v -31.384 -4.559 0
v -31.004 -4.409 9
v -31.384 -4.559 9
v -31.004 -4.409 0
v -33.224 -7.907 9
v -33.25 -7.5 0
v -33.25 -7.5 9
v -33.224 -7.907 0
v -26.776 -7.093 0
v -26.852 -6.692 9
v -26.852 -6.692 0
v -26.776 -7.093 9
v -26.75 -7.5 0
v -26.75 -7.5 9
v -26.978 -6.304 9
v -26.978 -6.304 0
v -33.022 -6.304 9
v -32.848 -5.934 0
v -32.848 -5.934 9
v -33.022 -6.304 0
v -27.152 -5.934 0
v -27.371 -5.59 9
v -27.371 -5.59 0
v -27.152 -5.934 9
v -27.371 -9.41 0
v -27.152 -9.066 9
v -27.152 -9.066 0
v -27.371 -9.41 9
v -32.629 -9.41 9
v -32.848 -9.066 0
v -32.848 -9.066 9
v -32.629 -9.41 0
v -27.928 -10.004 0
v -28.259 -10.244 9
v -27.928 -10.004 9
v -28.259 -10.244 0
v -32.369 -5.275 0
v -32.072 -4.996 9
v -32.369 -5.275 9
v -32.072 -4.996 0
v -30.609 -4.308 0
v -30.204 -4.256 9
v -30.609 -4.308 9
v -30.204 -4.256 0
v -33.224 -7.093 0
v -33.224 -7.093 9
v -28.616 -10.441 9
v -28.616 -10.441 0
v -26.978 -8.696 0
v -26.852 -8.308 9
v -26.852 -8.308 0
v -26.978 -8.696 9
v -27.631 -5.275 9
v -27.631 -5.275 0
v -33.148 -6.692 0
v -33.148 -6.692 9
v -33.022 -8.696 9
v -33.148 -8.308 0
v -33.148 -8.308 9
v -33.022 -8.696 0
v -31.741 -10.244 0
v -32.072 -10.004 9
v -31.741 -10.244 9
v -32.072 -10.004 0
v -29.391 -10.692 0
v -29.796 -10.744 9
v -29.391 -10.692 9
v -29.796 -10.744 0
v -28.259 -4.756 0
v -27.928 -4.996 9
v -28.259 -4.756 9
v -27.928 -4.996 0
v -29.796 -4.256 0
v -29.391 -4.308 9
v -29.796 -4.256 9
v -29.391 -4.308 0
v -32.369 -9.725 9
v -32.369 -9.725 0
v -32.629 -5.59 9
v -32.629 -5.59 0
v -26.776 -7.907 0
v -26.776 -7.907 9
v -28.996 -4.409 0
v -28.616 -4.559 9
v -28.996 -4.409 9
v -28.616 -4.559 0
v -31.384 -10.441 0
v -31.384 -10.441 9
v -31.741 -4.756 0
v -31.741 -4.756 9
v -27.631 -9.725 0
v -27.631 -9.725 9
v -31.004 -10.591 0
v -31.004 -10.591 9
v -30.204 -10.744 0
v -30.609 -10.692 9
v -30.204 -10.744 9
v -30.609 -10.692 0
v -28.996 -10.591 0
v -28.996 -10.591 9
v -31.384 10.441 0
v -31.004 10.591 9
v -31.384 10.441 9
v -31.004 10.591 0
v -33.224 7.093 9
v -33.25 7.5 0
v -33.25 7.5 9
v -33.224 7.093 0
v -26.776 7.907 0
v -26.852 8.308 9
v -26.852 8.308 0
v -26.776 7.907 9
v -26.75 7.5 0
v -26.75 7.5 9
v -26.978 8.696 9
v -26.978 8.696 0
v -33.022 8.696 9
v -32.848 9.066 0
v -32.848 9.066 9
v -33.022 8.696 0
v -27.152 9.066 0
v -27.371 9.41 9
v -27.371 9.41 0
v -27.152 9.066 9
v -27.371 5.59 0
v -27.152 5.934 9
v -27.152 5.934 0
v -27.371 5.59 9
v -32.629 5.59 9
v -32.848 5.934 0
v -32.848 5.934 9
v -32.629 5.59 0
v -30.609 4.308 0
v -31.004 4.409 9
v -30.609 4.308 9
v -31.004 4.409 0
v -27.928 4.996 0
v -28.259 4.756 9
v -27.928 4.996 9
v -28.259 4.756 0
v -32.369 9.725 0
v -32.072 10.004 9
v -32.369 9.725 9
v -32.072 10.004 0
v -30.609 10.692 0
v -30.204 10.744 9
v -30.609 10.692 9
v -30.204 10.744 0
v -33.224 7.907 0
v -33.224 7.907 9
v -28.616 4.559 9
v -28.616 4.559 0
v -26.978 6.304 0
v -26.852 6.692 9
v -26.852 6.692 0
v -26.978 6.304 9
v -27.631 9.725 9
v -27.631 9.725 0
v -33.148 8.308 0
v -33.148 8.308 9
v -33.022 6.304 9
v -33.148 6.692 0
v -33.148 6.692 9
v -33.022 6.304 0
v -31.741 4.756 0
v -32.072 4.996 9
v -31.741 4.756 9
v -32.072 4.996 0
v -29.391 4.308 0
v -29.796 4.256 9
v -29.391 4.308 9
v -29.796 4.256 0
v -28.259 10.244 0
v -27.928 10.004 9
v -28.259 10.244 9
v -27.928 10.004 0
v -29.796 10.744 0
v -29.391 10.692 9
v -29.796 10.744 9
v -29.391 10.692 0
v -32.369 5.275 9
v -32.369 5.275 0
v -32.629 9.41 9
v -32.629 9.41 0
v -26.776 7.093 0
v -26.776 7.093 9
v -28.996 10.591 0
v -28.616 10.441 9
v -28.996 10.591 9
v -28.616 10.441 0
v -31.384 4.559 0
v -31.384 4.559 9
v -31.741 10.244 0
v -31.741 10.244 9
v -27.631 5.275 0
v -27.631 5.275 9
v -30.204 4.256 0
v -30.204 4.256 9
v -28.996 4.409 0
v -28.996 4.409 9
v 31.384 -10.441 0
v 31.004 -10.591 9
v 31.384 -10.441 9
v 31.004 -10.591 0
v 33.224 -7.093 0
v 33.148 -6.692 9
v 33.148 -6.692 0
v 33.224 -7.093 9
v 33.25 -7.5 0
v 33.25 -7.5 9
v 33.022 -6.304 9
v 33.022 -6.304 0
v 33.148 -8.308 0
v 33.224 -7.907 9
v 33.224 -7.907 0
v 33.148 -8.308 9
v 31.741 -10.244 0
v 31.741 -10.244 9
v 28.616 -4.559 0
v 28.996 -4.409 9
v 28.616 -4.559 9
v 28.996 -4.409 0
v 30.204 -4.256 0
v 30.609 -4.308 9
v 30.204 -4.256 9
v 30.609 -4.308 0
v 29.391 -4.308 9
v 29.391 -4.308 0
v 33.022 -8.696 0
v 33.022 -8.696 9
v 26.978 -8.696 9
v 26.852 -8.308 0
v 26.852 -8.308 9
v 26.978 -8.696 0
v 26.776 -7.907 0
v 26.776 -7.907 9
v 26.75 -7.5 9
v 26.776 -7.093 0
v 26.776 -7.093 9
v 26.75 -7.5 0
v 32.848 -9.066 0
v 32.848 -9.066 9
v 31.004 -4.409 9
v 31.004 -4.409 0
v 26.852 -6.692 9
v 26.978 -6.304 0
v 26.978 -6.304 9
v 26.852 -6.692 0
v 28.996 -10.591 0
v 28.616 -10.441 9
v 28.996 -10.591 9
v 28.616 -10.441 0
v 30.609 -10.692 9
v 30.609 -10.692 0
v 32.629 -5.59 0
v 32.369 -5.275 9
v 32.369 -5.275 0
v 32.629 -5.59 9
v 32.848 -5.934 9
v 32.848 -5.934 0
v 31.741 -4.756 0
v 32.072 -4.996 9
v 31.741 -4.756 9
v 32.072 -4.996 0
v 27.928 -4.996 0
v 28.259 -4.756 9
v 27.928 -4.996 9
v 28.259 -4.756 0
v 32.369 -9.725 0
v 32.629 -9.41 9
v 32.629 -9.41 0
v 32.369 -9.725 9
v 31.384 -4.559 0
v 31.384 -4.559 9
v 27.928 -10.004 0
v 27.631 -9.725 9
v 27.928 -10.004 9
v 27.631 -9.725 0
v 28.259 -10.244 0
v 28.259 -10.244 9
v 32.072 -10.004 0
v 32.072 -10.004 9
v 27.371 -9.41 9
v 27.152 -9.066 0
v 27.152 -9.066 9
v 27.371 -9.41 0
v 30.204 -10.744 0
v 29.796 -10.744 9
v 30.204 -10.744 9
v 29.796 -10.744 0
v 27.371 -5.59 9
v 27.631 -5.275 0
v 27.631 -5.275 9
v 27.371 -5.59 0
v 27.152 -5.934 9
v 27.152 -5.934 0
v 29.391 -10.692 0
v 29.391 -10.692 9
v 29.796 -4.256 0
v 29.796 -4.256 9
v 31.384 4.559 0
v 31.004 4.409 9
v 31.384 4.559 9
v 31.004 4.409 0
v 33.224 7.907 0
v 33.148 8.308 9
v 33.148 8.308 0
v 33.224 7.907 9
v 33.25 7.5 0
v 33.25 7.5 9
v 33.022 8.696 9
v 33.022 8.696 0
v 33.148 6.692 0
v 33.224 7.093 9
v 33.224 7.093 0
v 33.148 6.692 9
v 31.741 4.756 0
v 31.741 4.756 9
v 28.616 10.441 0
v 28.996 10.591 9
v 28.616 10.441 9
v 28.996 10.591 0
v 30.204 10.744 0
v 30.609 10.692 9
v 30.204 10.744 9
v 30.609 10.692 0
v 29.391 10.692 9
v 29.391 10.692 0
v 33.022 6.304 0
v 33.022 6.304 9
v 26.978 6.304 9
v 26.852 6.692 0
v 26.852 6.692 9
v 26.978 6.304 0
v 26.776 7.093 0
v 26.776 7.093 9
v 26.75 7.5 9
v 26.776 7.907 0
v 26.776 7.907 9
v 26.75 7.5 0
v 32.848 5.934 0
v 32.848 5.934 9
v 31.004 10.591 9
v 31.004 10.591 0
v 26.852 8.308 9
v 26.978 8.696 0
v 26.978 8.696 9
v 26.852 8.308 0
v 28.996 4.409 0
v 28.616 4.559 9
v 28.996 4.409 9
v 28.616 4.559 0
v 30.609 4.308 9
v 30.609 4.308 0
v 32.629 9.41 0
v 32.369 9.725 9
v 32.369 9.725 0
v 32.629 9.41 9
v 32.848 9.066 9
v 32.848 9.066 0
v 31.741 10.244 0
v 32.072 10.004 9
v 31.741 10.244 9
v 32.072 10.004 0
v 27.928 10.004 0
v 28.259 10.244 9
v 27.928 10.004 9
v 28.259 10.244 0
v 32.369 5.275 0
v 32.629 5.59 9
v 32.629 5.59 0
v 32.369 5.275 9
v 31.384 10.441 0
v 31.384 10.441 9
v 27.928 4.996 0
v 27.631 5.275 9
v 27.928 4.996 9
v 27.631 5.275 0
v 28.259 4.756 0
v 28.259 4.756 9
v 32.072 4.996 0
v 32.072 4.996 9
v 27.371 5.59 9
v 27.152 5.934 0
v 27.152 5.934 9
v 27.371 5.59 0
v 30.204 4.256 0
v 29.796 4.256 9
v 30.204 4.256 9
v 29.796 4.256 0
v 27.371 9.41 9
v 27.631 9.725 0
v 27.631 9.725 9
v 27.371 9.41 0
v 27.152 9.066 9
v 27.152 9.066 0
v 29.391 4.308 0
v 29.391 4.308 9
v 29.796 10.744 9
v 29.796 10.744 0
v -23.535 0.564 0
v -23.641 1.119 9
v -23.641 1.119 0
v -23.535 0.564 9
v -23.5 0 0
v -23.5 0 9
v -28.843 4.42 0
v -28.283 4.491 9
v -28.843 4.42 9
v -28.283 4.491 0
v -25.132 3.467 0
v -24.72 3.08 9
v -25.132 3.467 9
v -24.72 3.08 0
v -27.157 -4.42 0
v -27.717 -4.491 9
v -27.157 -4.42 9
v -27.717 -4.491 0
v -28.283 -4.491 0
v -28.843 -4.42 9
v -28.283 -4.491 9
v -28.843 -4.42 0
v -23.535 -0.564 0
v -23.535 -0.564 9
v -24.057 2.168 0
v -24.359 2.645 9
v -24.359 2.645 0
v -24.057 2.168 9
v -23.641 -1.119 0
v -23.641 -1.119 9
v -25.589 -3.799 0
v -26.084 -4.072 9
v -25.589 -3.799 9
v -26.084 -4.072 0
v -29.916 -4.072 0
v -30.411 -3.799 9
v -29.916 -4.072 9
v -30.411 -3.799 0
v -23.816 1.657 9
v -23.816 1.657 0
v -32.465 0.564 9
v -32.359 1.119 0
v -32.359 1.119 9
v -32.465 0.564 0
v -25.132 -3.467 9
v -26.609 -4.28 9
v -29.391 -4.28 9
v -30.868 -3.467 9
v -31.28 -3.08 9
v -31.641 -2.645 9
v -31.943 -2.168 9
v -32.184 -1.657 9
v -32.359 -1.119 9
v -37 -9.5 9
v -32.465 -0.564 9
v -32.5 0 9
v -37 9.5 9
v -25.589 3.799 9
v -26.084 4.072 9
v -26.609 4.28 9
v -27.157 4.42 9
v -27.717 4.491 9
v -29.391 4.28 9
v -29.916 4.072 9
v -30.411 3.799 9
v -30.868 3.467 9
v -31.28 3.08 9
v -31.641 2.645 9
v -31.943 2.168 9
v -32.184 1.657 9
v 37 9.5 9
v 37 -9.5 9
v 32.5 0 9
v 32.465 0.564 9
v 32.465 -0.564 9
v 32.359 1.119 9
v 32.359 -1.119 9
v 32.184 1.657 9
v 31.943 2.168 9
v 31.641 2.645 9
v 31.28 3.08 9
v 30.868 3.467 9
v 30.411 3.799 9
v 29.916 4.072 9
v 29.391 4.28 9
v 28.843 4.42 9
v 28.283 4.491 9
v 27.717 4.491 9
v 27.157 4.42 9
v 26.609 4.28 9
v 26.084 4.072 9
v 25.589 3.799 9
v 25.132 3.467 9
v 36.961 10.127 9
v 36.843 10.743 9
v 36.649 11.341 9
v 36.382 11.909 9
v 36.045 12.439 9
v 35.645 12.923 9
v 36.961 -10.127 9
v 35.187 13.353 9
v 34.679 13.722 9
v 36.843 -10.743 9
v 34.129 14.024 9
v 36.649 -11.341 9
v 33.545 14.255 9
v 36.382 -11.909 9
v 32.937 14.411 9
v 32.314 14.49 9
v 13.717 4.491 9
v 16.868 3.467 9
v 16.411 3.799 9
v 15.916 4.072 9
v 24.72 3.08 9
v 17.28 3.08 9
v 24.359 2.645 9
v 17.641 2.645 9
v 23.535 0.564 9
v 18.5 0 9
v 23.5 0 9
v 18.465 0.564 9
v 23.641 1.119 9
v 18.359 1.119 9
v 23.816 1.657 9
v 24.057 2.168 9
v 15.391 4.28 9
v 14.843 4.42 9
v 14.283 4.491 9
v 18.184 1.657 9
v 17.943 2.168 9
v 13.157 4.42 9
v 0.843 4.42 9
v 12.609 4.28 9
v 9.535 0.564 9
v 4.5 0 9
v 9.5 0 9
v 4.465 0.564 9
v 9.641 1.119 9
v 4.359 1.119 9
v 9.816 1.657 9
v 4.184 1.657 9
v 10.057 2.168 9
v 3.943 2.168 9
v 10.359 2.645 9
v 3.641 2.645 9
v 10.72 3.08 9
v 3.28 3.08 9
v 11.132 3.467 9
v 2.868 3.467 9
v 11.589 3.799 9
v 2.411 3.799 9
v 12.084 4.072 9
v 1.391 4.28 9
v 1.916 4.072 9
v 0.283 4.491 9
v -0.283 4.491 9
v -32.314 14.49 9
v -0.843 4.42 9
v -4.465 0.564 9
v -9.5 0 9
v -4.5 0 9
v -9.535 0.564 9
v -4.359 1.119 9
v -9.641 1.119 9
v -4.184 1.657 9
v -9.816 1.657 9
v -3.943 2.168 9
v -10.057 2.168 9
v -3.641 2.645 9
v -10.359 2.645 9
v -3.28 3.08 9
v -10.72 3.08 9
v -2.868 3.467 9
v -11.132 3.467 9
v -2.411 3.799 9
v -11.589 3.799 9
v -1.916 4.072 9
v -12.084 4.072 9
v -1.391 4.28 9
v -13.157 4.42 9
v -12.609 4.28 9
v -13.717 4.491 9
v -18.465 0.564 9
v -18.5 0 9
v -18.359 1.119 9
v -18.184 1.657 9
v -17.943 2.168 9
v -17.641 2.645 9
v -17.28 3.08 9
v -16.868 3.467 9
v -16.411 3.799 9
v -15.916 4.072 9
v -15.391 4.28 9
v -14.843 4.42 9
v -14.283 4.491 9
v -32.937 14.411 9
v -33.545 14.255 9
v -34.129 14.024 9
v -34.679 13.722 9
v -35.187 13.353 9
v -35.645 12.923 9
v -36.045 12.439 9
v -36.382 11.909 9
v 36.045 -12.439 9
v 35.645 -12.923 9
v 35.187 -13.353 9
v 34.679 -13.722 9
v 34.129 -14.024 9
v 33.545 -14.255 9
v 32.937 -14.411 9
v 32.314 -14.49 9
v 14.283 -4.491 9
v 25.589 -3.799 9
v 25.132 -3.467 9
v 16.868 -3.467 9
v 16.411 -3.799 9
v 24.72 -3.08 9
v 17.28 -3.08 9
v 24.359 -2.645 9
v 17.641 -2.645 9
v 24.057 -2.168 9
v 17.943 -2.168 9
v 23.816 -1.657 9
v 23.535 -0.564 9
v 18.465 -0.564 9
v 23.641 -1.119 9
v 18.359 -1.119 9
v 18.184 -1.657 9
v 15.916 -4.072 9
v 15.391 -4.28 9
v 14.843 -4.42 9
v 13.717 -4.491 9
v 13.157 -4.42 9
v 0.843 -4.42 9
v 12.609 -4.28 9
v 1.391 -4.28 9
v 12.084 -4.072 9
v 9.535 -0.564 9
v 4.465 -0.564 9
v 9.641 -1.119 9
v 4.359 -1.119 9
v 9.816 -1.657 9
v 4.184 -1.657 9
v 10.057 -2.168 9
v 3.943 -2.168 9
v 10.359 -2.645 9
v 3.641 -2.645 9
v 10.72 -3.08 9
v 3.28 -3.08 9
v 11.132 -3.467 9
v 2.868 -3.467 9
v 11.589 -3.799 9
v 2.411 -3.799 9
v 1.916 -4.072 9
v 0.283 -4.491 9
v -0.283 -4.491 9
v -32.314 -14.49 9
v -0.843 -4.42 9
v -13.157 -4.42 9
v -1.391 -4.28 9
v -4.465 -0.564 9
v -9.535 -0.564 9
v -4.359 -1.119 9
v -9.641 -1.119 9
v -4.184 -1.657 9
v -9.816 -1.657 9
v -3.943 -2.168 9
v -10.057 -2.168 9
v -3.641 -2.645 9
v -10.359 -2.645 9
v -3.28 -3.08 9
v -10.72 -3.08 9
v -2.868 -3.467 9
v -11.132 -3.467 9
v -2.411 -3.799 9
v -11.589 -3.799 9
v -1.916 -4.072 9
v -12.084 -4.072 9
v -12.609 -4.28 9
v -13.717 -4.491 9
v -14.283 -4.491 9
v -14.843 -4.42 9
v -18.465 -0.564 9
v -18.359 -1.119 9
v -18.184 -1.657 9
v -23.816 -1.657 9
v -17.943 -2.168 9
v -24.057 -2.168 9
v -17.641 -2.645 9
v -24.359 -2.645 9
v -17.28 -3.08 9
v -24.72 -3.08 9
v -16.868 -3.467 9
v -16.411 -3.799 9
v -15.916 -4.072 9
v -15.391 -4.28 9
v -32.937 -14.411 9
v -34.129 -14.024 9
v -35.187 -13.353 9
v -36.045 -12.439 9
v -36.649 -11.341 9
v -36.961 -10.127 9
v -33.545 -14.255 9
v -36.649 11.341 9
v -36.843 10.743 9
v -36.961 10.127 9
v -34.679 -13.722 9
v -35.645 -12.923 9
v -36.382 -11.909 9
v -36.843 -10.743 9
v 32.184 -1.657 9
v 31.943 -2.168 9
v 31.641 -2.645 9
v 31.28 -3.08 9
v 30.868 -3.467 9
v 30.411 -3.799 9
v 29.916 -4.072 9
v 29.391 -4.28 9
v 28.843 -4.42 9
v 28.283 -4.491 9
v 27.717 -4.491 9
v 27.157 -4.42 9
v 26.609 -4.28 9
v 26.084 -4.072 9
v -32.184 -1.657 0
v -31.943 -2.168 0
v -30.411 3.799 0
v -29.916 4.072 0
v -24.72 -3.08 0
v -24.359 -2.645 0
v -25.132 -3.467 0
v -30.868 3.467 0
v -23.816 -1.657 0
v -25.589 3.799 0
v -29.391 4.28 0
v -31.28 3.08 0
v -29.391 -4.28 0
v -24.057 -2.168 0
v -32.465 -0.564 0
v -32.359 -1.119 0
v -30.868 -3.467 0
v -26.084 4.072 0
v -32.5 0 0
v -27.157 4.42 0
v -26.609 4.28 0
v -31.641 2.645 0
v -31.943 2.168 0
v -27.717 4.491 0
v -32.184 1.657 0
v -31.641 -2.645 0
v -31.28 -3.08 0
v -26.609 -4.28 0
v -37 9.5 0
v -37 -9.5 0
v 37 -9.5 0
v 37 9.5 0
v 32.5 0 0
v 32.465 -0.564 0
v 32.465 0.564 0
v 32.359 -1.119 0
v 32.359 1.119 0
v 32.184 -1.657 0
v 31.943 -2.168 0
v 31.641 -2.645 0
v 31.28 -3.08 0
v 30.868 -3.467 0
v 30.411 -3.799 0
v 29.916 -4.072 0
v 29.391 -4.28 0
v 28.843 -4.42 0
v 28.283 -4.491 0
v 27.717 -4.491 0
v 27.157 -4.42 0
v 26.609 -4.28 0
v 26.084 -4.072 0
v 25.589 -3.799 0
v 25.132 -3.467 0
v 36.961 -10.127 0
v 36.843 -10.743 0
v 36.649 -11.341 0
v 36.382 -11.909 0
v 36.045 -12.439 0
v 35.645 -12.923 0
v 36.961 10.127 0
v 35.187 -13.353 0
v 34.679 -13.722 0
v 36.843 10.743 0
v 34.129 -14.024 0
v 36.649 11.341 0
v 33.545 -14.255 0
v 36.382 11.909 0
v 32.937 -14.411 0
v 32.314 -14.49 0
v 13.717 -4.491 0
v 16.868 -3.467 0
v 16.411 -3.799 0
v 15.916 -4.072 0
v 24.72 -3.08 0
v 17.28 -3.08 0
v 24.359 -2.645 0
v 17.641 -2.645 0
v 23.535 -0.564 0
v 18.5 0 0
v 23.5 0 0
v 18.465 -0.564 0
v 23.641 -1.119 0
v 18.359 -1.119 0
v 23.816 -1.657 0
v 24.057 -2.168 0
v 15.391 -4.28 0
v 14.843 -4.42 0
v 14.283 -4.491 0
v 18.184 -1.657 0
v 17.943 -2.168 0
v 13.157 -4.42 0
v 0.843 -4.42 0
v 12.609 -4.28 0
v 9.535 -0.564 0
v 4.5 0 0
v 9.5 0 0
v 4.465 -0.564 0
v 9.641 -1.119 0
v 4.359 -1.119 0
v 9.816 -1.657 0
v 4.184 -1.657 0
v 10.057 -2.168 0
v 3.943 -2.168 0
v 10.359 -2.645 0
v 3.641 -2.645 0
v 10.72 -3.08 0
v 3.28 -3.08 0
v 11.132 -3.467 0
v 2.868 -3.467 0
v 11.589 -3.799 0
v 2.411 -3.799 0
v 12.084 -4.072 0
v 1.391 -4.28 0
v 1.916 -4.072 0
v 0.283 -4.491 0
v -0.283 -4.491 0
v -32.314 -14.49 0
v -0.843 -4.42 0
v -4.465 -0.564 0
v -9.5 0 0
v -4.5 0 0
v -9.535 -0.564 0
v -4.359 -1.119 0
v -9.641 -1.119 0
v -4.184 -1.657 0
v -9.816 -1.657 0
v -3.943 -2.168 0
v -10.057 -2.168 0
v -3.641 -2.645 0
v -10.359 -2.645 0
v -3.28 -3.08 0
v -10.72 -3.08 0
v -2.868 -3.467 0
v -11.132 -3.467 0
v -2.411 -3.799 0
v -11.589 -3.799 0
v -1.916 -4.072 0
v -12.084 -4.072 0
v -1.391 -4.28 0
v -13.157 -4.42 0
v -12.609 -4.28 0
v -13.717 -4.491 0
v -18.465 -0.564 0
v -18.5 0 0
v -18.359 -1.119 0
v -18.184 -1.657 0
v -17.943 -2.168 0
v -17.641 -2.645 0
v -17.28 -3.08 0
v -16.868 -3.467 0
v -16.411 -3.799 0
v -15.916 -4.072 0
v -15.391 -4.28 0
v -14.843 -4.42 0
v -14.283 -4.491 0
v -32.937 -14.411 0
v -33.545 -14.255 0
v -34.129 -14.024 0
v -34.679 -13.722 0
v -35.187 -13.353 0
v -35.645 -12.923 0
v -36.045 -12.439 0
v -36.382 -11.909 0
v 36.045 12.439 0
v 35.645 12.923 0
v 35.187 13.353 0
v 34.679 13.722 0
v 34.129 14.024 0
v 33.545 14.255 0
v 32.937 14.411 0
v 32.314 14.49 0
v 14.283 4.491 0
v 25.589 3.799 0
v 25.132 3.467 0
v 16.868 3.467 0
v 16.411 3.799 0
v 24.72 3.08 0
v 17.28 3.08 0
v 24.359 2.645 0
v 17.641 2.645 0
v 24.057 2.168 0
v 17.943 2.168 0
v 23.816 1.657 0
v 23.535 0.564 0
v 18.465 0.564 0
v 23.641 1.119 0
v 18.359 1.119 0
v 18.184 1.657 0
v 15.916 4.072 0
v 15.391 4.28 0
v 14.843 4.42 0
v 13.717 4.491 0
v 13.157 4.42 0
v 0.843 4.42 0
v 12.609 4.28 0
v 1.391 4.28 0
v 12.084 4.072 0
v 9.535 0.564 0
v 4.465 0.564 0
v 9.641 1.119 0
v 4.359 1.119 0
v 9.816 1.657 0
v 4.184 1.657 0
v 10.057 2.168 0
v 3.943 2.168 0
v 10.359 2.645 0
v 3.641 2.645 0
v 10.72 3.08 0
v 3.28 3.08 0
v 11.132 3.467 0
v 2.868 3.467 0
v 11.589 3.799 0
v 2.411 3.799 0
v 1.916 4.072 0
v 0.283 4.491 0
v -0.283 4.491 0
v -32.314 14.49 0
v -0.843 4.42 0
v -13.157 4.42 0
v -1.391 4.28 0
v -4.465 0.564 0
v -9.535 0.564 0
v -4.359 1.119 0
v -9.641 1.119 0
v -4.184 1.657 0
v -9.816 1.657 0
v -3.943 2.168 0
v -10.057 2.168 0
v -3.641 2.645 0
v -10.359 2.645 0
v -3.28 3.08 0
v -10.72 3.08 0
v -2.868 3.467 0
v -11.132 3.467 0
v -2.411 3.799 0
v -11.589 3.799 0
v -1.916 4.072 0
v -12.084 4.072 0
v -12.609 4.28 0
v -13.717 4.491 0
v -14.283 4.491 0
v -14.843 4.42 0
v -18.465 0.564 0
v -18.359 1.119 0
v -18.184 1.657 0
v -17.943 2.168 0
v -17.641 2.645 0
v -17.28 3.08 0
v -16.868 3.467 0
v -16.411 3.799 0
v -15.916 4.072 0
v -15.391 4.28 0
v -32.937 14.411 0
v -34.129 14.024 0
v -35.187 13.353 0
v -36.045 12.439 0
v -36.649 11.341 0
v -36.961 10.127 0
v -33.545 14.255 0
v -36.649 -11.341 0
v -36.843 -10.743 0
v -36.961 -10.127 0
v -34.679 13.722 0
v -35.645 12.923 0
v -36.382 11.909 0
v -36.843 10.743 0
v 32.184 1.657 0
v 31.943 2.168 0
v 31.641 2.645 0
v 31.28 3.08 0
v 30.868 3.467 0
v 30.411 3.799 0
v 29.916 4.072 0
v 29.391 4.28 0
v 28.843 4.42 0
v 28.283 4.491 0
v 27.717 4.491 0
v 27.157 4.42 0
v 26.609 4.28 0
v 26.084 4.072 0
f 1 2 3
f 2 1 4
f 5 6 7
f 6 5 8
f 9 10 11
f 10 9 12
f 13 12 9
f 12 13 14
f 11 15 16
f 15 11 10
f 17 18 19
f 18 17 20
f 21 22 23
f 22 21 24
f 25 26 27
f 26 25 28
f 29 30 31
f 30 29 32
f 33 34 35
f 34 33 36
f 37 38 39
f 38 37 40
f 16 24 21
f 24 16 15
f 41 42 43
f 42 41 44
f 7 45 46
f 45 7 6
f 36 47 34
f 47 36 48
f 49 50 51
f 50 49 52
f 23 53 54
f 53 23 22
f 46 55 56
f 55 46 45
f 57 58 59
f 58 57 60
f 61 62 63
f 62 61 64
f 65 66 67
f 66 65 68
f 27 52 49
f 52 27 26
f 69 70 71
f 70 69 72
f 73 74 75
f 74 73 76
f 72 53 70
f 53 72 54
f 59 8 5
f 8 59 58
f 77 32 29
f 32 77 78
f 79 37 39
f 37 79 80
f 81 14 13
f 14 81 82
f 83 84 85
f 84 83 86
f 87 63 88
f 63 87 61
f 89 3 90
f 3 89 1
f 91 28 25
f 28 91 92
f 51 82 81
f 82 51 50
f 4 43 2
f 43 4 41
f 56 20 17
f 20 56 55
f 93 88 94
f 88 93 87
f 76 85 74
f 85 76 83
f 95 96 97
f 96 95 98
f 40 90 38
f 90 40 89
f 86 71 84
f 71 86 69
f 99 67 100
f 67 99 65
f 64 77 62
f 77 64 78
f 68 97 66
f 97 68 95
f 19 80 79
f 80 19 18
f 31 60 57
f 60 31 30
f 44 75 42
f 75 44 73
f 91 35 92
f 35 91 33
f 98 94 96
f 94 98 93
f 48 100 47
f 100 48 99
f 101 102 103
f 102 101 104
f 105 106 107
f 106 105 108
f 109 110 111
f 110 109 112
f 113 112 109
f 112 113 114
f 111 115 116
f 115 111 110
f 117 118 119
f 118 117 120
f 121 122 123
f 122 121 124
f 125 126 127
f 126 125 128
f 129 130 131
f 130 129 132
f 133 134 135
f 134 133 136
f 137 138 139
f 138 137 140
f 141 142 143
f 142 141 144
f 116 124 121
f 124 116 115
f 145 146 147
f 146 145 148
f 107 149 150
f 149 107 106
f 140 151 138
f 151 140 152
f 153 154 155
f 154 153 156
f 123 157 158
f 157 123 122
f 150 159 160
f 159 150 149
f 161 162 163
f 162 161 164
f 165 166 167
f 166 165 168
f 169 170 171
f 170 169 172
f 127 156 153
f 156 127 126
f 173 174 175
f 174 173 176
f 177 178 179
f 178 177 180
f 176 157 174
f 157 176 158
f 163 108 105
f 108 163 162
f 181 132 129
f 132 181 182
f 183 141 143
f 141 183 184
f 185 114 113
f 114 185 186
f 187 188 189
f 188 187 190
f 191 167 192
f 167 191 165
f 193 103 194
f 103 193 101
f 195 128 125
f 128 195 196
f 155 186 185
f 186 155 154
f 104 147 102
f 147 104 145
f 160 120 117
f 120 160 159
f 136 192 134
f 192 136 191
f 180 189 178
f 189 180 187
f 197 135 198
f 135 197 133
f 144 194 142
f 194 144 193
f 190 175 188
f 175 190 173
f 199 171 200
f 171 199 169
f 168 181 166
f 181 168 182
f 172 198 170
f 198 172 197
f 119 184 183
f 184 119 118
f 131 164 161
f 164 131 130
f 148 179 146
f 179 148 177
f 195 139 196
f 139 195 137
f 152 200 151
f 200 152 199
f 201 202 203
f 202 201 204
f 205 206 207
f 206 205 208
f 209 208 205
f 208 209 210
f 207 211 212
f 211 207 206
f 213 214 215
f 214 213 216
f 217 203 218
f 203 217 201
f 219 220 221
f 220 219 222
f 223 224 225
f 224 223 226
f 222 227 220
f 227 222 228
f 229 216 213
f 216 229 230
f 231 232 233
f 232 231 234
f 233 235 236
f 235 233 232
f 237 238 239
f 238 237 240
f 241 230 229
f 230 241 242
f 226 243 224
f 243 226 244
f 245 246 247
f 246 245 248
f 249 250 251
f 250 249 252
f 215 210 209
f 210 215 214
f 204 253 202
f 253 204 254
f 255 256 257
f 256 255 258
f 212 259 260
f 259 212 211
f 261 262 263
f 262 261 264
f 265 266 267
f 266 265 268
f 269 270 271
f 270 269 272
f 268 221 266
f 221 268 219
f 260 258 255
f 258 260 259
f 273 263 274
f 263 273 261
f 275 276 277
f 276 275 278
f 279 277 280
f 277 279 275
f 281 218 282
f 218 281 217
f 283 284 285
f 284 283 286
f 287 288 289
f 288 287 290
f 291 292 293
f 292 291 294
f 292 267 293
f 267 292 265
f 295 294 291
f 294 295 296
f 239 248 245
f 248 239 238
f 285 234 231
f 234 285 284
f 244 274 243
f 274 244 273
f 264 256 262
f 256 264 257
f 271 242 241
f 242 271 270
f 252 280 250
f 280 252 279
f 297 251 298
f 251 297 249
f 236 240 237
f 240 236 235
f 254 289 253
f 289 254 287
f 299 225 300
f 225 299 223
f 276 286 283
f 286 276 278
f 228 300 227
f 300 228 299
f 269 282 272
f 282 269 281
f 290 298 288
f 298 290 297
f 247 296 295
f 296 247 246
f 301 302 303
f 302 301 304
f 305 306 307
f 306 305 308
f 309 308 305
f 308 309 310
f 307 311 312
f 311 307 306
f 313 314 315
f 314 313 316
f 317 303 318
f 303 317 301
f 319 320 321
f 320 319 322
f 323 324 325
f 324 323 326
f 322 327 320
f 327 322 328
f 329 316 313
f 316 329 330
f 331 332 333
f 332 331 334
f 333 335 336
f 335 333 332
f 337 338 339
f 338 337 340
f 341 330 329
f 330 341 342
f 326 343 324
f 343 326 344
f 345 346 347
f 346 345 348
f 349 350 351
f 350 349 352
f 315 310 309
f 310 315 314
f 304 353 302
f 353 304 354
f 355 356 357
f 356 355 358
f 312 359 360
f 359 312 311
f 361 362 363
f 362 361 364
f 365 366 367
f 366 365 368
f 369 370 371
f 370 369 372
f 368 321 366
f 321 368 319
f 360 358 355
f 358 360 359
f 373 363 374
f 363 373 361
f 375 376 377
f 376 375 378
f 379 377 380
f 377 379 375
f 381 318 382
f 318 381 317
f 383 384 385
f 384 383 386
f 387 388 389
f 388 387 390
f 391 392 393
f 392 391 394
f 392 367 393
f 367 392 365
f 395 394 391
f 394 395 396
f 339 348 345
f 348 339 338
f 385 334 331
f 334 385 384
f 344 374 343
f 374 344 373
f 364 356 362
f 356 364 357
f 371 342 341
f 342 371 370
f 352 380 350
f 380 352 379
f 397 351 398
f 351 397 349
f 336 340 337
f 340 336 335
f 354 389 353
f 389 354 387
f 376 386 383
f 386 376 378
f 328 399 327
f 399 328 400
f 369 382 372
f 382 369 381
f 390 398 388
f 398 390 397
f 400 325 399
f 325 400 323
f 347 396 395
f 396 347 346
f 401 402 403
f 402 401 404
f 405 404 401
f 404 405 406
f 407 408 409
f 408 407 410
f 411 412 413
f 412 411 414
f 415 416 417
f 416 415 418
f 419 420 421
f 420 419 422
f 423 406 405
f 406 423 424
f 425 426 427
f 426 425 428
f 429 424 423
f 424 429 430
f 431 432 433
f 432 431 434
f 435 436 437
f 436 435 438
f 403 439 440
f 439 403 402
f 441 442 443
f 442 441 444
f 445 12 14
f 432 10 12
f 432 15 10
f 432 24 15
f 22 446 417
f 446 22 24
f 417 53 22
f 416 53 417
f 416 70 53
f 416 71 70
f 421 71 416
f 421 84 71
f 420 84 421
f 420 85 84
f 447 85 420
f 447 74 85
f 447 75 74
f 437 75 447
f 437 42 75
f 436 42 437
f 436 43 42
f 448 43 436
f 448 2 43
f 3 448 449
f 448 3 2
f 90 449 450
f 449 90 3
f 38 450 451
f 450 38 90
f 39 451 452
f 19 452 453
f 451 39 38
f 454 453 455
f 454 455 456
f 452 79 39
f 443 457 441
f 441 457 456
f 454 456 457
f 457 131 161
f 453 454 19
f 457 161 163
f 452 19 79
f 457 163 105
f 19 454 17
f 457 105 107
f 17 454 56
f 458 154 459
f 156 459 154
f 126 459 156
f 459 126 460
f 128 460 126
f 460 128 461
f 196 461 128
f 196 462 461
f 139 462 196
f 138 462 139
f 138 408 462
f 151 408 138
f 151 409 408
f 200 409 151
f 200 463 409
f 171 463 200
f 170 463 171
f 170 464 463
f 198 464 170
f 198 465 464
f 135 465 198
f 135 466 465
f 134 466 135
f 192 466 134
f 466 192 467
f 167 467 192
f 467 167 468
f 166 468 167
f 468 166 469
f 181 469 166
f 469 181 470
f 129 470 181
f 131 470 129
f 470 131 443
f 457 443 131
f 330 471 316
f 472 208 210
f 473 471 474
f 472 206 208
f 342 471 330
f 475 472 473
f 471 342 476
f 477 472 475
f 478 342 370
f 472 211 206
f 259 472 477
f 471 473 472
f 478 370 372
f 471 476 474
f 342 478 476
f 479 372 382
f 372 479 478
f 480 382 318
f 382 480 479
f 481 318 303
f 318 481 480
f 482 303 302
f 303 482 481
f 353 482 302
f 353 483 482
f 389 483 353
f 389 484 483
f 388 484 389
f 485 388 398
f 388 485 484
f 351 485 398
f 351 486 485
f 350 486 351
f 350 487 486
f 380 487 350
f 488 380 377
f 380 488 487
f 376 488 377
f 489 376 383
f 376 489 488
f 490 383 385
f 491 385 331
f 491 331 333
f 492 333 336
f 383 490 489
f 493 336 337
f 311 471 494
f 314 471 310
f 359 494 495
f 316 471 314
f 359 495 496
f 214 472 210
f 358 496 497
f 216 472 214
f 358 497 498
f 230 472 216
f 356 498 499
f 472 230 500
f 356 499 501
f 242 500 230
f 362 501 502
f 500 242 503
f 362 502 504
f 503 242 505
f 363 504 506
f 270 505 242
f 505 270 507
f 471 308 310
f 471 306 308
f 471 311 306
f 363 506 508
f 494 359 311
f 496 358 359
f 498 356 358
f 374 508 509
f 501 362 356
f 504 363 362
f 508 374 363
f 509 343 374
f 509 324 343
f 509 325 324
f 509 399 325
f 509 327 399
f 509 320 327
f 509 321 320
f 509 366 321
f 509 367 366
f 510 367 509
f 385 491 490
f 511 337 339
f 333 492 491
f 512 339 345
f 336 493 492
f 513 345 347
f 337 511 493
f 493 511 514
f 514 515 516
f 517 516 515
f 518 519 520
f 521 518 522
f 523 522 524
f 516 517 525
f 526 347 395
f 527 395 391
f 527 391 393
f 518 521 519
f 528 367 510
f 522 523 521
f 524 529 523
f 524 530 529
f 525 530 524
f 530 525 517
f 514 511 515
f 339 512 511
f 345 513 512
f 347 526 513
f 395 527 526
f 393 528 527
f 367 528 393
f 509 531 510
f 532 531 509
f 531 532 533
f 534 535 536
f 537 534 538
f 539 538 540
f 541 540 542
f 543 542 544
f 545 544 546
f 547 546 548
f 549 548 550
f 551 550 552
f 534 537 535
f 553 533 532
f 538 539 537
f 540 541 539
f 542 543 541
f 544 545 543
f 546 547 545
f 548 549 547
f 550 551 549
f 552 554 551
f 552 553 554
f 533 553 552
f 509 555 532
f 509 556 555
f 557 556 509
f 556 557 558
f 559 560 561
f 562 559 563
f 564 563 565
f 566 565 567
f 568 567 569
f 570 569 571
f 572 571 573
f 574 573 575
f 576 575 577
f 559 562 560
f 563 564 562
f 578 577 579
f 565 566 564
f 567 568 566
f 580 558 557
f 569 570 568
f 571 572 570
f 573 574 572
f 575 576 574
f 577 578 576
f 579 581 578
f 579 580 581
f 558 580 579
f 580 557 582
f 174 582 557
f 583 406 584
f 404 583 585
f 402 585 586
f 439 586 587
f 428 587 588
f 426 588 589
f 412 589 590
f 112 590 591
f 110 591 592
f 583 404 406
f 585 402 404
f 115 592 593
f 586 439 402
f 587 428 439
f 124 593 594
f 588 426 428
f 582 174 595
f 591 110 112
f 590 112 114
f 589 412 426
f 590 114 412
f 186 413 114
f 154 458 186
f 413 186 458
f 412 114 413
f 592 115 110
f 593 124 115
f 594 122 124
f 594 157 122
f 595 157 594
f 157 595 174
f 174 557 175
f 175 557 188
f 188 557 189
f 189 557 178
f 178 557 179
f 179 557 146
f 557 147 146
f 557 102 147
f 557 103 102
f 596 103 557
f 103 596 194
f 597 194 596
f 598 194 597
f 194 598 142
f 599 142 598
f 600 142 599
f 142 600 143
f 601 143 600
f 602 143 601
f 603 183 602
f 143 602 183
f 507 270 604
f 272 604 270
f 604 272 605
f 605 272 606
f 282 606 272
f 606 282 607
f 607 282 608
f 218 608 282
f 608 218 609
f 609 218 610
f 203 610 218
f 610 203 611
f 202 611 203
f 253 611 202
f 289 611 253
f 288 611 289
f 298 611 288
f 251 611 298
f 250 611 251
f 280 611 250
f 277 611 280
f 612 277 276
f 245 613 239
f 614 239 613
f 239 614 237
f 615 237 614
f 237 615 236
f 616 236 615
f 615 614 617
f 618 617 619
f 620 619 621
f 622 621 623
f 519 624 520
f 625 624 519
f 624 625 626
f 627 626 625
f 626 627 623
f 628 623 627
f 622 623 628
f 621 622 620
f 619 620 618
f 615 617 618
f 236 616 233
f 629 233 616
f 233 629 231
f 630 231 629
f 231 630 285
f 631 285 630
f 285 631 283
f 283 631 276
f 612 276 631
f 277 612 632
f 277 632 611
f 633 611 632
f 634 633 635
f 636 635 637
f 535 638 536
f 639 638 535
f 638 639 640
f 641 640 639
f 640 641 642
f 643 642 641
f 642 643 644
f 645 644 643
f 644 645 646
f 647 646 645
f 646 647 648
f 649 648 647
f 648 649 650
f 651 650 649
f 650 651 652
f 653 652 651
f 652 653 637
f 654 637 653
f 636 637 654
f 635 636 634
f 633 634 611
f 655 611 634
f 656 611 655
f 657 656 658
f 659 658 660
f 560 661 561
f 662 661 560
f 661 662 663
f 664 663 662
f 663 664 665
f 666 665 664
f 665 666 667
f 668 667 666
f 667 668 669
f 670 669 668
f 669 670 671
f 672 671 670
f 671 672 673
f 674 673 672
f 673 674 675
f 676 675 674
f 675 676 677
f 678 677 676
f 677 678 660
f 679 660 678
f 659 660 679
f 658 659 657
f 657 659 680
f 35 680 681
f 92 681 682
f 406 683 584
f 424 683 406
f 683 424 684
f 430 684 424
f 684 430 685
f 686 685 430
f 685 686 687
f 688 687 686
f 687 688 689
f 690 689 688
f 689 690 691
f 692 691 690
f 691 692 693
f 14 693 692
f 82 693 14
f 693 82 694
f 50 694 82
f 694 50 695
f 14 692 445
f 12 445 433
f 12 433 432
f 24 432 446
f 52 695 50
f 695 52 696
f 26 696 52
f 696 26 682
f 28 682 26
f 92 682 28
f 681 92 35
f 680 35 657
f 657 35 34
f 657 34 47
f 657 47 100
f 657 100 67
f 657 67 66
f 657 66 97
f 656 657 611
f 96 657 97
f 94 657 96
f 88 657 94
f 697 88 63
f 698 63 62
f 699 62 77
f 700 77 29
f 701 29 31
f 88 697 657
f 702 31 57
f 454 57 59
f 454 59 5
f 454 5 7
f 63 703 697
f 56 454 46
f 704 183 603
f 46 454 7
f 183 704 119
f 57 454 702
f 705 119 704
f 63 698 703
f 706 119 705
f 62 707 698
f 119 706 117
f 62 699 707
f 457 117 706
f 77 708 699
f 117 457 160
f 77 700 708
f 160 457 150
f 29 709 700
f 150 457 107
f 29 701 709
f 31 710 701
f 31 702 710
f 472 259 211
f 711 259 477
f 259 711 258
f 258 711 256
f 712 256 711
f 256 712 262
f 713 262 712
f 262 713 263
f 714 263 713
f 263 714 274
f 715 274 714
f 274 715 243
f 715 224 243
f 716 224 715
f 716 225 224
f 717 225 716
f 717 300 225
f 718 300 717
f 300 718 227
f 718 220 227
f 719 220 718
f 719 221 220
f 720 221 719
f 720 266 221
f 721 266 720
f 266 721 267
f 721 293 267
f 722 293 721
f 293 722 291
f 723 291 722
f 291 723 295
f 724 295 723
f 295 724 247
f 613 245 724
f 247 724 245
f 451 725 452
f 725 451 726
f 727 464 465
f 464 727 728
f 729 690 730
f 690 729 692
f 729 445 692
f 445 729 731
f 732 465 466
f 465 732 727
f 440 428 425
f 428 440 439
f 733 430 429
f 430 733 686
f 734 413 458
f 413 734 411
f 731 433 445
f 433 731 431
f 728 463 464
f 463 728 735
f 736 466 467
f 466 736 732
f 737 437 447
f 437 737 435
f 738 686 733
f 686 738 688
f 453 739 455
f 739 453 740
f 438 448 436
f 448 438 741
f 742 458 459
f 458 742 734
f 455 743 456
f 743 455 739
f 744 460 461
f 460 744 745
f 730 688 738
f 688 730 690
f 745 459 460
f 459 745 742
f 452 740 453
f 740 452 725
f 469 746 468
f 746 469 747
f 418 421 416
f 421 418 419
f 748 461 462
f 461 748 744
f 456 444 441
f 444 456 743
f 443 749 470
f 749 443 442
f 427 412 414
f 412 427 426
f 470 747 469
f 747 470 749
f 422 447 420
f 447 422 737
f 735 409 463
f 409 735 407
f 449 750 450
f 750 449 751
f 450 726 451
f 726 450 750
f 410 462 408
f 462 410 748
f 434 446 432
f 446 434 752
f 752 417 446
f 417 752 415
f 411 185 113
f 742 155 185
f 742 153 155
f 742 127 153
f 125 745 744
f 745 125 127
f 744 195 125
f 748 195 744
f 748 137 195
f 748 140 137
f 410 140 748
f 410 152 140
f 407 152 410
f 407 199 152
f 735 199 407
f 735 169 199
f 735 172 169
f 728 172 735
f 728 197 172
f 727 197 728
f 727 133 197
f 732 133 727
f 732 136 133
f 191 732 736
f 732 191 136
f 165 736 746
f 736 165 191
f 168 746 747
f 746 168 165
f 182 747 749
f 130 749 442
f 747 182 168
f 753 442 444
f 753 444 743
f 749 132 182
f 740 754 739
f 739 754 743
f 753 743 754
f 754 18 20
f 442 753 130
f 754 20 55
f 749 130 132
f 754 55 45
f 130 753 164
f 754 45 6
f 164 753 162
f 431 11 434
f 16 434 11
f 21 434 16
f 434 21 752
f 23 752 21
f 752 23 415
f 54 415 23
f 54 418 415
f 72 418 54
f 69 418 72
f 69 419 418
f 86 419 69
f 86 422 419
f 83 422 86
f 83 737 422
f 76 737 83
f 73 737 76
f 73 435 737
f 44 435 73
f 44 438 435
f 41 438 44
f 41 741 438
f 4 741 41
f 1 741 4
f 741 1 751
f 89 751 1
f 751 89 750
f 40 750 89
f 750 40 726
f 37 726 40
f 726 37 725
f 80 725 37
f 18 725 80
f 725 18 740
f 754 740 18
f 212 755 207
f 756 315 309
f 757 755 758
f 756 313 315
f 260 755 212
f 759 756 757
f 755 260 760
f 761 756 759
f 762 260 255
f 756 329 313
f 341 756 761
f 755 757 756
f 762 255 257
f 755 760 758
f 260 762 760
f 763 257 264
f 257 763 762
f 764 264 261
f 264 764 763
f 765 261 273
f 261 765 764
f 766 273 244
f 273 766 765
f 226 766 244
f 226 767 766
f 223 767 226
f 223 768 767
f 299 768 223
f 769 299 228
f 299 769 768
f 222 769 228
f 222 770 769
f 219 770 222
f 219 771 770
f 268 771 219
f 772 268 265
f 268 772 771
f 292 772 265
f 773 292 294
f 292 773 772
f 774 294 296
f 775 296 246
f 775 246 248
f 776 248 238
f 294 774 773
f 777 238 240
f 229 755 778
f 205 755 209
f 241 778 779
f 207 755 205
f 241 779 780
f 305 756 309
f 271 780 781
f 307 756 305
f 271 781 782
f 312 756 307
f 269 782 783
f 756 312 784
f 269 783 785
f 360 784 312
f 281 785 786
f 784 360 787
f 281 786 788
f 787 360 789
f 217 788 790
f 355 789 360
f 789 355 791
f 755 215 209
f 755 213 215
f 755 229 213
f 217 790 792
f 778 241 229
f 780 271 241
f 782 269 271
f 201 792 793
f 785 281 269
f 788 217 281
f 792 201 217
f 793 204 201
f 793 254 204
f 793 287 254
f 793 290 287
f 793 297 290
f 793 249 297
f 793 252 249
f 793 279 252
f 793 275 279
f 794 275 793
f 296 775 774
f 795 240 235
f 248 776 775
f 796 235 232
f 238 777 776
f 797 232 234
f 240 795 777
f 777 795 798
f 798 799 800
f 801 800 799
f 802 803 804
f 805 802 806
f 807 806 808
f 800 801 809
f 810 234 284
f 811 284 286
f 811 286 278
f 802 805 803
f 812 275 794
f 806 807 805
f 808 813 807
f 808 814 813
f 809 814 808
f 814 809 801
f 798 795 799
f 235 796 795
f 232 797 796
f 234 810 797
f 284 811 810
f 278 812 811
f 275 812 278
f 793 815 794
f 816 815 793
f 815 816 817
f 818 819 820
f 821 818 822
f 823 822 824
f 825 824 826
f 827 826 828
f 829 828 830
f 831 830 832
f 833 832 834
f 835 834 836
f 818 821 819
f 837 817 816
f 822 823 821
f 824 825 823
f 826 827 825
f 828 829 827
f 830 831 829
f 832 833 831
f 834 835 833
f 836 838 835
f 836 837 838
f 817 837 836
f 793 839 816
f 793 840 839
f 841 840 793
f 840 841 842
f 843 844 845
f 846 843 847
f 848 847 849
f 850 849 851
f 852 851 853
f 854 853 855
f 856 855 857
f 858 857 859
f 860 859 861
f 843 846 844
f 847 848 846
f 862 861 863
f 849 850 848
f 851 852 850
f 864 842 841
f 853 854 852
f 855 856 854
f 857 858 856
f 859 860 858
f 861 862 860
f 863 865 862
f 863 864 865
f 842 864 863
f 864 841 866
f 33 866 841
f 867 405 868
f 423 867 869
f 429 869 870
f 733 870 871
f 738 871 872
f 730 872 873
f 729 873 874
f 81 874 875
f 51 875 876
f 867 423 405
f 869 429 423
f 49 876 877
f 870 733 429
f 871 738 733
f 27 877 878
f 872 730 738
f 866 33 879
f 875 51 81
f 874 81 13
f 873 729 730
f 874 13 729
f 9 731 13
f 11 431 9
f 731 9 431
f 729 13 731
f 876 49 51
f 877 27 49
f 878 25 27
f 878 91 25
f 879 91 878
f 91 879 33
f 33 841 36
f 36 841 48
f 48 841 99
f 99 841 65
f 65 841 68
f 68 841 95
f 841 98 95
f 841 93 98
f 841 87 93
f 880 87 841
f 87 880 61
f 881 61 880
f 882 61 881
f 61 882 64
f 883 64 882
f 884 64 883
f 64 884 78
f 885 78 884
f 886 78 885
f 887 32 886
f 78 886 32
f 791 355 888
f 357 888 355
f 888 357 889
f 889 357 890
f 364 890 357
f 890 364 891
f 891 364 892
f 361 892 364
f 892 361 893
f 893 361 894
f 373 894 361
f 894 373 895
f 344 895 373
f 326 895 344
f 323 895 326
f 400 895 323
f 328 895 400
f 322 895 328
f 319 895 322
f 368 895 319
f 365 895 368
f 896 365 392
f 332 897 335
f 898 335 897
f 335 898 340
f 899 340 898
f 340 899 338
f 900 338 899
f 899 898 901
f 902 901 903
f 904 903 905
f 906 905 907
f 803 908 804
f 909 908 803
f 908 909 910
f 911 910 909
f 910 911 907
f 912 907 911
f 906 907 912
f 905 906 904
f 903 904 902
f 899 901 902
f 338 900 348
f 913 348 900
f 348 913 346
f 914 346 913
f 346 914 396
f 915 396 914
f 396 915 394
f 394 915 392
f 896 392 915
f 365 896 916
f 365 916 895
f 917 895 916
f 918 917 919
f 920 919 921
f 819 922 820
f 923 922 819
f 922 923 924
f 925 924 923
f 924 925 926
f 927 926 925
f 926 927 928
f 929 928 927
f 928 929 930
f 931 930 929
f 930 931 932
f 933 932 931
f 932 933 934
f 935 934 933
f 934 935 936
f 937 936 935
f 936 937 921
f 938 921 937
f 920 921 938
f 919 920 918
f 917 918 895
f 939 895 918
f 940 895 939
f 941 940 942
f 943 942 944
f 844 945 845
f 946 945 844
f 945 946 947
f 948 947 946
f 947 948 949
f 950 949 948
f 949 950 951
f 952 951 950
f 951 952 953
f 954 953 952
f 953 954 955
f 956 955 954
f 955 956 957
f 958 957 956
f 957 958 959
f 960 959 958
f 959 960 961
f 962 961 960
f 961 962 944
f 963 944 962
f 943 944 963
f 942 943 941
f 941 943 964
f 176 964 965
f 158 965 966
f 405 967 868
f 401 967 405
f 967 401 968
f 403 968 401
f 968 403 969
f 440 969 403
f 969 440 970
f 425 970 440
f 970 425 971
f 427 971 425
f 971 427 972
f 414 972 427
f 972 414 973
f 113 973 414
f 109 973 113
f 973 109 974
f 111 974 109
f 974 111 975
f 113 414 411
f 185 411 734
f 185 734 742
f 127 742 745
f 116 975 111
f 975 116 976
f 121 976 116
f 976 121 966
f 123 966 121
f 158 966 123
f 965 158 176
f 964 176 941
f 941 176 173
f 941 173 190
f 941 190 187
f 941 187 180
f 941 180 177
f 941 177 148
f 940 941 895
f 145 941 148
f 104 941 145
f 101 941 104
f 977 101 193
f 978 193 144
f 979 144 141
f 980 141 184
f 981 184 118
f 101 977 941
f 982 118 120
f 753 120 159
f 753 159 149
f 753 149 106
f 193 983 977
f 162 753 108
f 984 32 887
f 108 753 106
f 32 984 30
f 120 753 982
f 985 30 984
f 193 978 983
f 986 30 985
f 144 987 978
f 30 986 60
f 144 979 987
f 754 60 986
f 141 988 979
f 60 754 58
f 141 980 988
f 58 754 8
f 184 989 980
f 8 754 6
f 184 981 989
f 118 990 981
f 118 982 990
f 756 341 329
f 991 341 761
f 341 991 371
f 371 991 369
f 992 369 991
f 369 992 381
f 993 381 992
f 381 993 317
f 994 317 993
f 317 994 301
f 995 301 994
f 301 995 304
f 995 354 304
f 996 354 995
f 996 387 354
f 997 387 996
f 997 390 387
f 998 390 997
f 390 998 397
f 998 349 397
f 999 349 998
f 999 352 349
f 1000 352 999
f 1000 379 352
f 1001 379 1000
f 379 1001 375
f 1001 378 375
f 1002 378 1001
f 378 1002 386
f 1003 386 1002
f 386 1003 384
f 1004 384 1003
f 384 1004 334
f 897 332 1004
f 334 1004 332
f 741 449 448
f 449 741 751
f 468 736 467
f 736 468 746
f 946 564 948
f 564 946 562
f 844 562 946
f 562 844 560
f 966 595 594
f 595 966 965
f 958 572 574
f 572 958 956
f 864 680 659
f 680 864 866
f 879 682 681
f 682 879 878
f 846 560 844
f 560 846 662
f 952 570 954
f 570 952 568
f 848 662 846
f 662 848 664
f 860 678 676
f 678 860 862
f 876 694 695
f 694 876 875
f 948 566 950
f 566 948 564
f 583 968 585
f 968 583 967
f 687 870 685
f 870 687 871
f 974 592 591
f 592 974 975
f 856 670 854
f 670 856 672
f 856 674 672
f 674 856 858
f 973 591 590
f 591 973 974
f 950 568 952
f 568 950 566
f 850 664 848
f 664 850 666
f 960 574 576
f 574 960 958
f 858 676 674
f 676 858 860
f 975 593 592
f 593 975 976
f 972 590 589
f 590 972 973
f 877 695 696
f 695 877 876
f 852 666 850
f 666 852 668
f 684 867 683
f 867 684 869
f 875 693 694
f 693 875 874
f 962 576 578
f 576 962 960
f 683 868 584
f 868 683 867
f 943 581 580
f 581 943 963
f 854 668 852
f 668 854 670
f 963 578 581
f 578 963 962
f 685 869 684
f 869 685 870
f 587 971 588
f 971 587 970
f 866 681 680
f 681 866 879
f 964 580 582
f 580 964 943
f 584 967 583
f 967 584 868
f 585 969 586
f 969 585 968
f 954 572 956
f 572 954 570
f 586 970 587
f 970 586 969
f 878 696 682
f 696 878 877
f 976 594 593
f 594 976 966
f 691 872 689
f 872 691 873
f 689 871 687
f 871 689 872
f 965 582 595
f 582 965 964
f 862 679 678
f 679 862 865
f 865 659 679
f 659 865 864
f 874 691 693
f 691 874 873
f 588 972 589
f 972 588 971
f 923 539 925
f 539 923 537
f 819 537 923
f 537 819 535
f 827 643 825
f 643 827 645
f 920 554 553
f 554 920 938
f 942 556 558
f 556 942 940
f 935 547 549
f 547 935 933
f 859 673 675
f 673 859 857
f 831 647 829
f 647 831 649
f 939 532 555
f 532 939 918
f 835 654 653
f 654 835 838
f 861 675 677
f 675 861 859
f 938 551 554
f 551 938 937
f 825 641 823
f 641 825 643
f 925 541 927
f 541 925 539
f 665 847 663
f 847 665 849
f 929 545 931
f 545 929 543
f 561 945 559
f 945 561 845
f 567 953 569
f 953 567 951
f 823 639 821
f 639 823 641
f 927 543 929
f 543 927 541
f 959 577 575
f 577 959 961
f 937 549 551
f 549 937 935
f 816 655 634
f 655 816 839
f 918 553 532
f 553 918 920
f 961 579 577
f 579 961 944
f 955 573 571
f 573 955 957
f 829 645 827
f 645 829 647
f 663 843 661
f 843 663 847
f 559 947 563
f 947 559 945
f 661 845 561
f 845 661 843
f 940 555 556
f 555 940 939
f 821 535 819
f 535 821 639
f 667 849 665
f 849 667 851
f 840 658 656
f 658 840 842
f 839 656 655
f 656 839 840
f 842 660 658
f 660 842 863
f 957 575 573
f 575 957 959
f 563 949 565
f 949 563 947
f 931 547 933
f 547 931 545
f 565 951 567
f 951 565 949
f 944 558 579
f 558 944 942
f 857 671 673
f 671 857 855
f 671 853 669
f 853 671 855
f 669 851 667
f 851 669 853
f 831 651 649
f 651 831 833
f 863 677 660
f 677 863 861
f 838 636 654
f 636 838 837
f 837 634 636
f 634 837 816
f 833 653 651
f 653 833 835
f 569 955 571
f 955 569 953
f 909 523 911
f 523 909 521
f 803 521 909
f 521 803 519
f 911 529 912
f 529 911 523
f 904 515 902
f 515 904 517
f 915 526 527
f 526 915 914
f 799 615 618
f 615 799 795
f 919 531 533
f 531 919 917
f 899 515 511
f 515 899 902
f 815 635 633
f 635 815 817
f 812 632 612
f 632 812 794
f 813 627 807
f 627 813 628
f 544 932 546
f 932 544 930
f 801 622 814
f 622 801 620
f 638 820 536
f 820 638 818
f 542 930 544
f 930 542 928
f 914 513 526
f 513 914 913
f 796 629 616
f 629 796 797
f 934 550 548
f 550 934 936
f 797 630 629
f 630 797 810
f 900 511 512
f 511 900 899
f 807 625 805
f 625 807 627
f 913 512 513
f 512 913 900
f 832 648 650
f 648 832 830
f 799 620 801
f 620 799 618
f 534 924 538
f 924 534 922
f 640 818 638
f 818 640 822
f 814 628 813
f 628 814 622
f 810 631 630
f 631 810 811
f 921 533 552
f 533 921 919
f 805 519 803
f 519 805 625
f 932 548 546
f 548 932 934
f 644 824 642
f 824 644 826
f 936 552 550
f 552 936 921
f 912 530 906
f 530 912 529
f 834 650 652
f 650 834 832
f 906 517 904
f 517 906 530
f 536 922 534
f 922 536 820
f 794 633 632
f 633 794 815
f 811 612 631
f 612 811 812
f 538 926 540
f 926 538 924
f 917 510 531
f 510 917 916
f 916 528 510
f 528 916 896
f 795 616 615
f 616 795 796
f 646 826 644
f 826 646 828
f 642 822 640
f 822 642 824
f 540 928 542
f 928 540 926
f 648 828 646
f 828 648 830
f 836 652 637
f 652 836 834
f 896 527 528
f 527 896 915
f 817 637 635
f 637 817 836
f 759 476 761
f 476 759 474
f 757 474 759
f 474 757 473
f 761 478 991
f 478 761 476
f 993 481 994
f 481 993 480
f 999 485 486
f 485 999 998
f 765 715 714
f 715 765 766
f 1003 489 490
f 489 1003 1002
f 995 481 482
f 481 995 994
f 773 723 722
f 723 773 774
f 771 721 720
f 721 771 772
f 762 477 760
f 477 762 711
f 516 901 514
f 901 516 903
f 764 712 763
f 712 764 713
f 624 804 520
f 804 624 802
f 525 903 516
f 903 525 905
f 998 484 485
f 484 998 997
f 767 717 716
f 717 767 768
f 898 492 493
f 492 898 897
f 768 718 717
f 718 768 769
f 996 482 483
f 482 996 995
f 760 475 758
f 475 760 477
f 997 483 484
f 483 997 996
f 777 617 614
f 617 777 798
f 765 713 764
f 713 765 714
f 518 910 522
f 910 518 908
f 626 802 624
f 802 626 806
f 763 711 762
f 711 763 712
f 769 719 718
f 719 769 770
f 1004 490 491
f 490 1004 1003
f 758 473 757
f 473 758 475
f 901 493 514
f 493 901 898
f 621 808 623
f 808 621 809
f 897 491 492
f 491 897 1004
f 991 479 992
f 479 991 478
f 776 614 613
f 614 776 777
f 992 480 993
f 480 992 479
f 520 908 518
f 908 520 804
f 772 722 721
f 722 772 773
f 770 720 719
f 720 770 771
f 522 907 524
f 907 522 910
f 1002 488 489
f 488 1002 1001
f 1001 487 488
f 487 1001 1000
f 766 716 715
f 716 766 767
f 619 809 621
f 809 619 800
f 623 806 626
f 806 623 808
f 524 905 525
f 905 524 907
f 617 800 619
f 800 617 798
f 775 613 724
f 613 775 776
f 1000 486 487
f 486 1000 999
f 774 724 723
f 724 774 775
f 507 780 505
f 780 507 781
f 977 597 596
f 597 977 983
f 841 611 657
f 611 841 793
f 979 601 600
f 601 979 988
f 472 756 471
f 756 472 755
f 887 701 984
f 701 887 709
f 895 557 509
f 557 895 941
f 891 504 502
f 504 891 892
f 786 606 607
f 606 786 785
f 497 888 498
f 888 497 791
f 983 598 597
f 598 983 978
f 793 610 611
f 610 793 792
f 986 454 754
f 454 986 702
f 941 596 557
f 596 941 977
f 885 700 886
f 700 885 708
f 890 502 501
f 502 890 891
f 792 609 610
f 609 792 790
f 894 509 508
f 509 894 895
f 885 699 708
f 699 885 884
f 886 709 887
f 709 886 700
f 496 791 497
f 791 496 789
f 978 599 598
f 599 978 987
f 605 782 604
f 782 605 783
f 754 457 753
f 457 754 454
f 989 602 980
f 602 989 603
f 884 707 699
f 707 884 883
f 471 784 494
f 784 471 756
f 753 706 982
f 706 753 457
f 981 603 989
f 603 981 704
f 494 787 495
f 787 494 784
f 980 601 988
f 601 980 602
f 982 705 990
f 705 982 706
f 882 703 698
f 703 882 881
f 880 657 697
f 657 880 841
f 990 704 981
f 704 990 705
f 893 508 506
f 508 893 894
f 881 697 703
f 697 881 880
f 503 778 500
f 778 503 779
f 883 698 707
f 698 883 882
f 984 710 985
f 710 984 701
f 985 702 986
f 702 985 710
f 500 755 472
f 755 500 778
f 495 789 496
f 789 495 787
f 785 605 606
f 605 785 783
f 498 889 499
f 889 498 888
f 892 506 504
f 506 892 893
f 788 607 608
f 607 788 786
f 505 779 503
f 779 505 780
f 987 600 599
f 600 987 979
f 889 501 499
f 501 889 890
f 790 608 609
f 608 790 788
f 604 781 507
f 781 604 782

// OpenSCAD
$fn = 50;


difference() {
	union() {
		hull() {
			translate(v = [-32.0000000000, 9.5000000000, 0]) {
				cylinder(h = 9, r = 5);
			}
			translate(v = [32.0000000000, 9.5000000000, 0]) {
				cylinder(h = 9, r = 5);
			}
			translate(v = [-32.0000000000, -9.5000000000, 0]) {
				cylinder(h = 9, r = 5);
			}
			translate(v = [32.0000000000, -9.5000000000, 0]) {
				cylinder(h = 9, r = 5);
			}
		}
	}
	union() {
		#translate(v = [-30.0000000000, -7.5000000000, -100.0000000000]) {
			cylinder(h = 200, r = 3.2500000000);
		}
		#translate(v = [-30.0000000000, 7.5000000000, -100.0000000000]) {
			cylinder(h = 200, r = 3.2500000000);
		}
		#translate(v = [30.0000000000, -7.5000000000, -100.0000000000]) {
			cylinder(h = 200, r = 3.2500000000);
		}
		#translate(v = [30.0000000000, 7.5000000000, -100.0000000000]) {
			cylinder(h = 200, r = 3.2500000000);
		}
		#translate(v = [-28.0000000000, 0, 0]) {
			cylinder(h = 9, r = 4.5000000000);
		}
		#translate(v = [-14.0000000000, 0, 0]) {
			cylinder(h = 9, r = 4.5000000000);
		}
		#cylinder(h = 9, r = 4.5000000000);
		#translate(v = [14.0000000000, 0, 0]) {
			cylinder(h = 9, r = 4.5000000000);
		}
		#translate(v = [28.0000000000, 0, 0]) {
			cylinder(h = 9, r = 4.5000000000);
		}
	}
}
